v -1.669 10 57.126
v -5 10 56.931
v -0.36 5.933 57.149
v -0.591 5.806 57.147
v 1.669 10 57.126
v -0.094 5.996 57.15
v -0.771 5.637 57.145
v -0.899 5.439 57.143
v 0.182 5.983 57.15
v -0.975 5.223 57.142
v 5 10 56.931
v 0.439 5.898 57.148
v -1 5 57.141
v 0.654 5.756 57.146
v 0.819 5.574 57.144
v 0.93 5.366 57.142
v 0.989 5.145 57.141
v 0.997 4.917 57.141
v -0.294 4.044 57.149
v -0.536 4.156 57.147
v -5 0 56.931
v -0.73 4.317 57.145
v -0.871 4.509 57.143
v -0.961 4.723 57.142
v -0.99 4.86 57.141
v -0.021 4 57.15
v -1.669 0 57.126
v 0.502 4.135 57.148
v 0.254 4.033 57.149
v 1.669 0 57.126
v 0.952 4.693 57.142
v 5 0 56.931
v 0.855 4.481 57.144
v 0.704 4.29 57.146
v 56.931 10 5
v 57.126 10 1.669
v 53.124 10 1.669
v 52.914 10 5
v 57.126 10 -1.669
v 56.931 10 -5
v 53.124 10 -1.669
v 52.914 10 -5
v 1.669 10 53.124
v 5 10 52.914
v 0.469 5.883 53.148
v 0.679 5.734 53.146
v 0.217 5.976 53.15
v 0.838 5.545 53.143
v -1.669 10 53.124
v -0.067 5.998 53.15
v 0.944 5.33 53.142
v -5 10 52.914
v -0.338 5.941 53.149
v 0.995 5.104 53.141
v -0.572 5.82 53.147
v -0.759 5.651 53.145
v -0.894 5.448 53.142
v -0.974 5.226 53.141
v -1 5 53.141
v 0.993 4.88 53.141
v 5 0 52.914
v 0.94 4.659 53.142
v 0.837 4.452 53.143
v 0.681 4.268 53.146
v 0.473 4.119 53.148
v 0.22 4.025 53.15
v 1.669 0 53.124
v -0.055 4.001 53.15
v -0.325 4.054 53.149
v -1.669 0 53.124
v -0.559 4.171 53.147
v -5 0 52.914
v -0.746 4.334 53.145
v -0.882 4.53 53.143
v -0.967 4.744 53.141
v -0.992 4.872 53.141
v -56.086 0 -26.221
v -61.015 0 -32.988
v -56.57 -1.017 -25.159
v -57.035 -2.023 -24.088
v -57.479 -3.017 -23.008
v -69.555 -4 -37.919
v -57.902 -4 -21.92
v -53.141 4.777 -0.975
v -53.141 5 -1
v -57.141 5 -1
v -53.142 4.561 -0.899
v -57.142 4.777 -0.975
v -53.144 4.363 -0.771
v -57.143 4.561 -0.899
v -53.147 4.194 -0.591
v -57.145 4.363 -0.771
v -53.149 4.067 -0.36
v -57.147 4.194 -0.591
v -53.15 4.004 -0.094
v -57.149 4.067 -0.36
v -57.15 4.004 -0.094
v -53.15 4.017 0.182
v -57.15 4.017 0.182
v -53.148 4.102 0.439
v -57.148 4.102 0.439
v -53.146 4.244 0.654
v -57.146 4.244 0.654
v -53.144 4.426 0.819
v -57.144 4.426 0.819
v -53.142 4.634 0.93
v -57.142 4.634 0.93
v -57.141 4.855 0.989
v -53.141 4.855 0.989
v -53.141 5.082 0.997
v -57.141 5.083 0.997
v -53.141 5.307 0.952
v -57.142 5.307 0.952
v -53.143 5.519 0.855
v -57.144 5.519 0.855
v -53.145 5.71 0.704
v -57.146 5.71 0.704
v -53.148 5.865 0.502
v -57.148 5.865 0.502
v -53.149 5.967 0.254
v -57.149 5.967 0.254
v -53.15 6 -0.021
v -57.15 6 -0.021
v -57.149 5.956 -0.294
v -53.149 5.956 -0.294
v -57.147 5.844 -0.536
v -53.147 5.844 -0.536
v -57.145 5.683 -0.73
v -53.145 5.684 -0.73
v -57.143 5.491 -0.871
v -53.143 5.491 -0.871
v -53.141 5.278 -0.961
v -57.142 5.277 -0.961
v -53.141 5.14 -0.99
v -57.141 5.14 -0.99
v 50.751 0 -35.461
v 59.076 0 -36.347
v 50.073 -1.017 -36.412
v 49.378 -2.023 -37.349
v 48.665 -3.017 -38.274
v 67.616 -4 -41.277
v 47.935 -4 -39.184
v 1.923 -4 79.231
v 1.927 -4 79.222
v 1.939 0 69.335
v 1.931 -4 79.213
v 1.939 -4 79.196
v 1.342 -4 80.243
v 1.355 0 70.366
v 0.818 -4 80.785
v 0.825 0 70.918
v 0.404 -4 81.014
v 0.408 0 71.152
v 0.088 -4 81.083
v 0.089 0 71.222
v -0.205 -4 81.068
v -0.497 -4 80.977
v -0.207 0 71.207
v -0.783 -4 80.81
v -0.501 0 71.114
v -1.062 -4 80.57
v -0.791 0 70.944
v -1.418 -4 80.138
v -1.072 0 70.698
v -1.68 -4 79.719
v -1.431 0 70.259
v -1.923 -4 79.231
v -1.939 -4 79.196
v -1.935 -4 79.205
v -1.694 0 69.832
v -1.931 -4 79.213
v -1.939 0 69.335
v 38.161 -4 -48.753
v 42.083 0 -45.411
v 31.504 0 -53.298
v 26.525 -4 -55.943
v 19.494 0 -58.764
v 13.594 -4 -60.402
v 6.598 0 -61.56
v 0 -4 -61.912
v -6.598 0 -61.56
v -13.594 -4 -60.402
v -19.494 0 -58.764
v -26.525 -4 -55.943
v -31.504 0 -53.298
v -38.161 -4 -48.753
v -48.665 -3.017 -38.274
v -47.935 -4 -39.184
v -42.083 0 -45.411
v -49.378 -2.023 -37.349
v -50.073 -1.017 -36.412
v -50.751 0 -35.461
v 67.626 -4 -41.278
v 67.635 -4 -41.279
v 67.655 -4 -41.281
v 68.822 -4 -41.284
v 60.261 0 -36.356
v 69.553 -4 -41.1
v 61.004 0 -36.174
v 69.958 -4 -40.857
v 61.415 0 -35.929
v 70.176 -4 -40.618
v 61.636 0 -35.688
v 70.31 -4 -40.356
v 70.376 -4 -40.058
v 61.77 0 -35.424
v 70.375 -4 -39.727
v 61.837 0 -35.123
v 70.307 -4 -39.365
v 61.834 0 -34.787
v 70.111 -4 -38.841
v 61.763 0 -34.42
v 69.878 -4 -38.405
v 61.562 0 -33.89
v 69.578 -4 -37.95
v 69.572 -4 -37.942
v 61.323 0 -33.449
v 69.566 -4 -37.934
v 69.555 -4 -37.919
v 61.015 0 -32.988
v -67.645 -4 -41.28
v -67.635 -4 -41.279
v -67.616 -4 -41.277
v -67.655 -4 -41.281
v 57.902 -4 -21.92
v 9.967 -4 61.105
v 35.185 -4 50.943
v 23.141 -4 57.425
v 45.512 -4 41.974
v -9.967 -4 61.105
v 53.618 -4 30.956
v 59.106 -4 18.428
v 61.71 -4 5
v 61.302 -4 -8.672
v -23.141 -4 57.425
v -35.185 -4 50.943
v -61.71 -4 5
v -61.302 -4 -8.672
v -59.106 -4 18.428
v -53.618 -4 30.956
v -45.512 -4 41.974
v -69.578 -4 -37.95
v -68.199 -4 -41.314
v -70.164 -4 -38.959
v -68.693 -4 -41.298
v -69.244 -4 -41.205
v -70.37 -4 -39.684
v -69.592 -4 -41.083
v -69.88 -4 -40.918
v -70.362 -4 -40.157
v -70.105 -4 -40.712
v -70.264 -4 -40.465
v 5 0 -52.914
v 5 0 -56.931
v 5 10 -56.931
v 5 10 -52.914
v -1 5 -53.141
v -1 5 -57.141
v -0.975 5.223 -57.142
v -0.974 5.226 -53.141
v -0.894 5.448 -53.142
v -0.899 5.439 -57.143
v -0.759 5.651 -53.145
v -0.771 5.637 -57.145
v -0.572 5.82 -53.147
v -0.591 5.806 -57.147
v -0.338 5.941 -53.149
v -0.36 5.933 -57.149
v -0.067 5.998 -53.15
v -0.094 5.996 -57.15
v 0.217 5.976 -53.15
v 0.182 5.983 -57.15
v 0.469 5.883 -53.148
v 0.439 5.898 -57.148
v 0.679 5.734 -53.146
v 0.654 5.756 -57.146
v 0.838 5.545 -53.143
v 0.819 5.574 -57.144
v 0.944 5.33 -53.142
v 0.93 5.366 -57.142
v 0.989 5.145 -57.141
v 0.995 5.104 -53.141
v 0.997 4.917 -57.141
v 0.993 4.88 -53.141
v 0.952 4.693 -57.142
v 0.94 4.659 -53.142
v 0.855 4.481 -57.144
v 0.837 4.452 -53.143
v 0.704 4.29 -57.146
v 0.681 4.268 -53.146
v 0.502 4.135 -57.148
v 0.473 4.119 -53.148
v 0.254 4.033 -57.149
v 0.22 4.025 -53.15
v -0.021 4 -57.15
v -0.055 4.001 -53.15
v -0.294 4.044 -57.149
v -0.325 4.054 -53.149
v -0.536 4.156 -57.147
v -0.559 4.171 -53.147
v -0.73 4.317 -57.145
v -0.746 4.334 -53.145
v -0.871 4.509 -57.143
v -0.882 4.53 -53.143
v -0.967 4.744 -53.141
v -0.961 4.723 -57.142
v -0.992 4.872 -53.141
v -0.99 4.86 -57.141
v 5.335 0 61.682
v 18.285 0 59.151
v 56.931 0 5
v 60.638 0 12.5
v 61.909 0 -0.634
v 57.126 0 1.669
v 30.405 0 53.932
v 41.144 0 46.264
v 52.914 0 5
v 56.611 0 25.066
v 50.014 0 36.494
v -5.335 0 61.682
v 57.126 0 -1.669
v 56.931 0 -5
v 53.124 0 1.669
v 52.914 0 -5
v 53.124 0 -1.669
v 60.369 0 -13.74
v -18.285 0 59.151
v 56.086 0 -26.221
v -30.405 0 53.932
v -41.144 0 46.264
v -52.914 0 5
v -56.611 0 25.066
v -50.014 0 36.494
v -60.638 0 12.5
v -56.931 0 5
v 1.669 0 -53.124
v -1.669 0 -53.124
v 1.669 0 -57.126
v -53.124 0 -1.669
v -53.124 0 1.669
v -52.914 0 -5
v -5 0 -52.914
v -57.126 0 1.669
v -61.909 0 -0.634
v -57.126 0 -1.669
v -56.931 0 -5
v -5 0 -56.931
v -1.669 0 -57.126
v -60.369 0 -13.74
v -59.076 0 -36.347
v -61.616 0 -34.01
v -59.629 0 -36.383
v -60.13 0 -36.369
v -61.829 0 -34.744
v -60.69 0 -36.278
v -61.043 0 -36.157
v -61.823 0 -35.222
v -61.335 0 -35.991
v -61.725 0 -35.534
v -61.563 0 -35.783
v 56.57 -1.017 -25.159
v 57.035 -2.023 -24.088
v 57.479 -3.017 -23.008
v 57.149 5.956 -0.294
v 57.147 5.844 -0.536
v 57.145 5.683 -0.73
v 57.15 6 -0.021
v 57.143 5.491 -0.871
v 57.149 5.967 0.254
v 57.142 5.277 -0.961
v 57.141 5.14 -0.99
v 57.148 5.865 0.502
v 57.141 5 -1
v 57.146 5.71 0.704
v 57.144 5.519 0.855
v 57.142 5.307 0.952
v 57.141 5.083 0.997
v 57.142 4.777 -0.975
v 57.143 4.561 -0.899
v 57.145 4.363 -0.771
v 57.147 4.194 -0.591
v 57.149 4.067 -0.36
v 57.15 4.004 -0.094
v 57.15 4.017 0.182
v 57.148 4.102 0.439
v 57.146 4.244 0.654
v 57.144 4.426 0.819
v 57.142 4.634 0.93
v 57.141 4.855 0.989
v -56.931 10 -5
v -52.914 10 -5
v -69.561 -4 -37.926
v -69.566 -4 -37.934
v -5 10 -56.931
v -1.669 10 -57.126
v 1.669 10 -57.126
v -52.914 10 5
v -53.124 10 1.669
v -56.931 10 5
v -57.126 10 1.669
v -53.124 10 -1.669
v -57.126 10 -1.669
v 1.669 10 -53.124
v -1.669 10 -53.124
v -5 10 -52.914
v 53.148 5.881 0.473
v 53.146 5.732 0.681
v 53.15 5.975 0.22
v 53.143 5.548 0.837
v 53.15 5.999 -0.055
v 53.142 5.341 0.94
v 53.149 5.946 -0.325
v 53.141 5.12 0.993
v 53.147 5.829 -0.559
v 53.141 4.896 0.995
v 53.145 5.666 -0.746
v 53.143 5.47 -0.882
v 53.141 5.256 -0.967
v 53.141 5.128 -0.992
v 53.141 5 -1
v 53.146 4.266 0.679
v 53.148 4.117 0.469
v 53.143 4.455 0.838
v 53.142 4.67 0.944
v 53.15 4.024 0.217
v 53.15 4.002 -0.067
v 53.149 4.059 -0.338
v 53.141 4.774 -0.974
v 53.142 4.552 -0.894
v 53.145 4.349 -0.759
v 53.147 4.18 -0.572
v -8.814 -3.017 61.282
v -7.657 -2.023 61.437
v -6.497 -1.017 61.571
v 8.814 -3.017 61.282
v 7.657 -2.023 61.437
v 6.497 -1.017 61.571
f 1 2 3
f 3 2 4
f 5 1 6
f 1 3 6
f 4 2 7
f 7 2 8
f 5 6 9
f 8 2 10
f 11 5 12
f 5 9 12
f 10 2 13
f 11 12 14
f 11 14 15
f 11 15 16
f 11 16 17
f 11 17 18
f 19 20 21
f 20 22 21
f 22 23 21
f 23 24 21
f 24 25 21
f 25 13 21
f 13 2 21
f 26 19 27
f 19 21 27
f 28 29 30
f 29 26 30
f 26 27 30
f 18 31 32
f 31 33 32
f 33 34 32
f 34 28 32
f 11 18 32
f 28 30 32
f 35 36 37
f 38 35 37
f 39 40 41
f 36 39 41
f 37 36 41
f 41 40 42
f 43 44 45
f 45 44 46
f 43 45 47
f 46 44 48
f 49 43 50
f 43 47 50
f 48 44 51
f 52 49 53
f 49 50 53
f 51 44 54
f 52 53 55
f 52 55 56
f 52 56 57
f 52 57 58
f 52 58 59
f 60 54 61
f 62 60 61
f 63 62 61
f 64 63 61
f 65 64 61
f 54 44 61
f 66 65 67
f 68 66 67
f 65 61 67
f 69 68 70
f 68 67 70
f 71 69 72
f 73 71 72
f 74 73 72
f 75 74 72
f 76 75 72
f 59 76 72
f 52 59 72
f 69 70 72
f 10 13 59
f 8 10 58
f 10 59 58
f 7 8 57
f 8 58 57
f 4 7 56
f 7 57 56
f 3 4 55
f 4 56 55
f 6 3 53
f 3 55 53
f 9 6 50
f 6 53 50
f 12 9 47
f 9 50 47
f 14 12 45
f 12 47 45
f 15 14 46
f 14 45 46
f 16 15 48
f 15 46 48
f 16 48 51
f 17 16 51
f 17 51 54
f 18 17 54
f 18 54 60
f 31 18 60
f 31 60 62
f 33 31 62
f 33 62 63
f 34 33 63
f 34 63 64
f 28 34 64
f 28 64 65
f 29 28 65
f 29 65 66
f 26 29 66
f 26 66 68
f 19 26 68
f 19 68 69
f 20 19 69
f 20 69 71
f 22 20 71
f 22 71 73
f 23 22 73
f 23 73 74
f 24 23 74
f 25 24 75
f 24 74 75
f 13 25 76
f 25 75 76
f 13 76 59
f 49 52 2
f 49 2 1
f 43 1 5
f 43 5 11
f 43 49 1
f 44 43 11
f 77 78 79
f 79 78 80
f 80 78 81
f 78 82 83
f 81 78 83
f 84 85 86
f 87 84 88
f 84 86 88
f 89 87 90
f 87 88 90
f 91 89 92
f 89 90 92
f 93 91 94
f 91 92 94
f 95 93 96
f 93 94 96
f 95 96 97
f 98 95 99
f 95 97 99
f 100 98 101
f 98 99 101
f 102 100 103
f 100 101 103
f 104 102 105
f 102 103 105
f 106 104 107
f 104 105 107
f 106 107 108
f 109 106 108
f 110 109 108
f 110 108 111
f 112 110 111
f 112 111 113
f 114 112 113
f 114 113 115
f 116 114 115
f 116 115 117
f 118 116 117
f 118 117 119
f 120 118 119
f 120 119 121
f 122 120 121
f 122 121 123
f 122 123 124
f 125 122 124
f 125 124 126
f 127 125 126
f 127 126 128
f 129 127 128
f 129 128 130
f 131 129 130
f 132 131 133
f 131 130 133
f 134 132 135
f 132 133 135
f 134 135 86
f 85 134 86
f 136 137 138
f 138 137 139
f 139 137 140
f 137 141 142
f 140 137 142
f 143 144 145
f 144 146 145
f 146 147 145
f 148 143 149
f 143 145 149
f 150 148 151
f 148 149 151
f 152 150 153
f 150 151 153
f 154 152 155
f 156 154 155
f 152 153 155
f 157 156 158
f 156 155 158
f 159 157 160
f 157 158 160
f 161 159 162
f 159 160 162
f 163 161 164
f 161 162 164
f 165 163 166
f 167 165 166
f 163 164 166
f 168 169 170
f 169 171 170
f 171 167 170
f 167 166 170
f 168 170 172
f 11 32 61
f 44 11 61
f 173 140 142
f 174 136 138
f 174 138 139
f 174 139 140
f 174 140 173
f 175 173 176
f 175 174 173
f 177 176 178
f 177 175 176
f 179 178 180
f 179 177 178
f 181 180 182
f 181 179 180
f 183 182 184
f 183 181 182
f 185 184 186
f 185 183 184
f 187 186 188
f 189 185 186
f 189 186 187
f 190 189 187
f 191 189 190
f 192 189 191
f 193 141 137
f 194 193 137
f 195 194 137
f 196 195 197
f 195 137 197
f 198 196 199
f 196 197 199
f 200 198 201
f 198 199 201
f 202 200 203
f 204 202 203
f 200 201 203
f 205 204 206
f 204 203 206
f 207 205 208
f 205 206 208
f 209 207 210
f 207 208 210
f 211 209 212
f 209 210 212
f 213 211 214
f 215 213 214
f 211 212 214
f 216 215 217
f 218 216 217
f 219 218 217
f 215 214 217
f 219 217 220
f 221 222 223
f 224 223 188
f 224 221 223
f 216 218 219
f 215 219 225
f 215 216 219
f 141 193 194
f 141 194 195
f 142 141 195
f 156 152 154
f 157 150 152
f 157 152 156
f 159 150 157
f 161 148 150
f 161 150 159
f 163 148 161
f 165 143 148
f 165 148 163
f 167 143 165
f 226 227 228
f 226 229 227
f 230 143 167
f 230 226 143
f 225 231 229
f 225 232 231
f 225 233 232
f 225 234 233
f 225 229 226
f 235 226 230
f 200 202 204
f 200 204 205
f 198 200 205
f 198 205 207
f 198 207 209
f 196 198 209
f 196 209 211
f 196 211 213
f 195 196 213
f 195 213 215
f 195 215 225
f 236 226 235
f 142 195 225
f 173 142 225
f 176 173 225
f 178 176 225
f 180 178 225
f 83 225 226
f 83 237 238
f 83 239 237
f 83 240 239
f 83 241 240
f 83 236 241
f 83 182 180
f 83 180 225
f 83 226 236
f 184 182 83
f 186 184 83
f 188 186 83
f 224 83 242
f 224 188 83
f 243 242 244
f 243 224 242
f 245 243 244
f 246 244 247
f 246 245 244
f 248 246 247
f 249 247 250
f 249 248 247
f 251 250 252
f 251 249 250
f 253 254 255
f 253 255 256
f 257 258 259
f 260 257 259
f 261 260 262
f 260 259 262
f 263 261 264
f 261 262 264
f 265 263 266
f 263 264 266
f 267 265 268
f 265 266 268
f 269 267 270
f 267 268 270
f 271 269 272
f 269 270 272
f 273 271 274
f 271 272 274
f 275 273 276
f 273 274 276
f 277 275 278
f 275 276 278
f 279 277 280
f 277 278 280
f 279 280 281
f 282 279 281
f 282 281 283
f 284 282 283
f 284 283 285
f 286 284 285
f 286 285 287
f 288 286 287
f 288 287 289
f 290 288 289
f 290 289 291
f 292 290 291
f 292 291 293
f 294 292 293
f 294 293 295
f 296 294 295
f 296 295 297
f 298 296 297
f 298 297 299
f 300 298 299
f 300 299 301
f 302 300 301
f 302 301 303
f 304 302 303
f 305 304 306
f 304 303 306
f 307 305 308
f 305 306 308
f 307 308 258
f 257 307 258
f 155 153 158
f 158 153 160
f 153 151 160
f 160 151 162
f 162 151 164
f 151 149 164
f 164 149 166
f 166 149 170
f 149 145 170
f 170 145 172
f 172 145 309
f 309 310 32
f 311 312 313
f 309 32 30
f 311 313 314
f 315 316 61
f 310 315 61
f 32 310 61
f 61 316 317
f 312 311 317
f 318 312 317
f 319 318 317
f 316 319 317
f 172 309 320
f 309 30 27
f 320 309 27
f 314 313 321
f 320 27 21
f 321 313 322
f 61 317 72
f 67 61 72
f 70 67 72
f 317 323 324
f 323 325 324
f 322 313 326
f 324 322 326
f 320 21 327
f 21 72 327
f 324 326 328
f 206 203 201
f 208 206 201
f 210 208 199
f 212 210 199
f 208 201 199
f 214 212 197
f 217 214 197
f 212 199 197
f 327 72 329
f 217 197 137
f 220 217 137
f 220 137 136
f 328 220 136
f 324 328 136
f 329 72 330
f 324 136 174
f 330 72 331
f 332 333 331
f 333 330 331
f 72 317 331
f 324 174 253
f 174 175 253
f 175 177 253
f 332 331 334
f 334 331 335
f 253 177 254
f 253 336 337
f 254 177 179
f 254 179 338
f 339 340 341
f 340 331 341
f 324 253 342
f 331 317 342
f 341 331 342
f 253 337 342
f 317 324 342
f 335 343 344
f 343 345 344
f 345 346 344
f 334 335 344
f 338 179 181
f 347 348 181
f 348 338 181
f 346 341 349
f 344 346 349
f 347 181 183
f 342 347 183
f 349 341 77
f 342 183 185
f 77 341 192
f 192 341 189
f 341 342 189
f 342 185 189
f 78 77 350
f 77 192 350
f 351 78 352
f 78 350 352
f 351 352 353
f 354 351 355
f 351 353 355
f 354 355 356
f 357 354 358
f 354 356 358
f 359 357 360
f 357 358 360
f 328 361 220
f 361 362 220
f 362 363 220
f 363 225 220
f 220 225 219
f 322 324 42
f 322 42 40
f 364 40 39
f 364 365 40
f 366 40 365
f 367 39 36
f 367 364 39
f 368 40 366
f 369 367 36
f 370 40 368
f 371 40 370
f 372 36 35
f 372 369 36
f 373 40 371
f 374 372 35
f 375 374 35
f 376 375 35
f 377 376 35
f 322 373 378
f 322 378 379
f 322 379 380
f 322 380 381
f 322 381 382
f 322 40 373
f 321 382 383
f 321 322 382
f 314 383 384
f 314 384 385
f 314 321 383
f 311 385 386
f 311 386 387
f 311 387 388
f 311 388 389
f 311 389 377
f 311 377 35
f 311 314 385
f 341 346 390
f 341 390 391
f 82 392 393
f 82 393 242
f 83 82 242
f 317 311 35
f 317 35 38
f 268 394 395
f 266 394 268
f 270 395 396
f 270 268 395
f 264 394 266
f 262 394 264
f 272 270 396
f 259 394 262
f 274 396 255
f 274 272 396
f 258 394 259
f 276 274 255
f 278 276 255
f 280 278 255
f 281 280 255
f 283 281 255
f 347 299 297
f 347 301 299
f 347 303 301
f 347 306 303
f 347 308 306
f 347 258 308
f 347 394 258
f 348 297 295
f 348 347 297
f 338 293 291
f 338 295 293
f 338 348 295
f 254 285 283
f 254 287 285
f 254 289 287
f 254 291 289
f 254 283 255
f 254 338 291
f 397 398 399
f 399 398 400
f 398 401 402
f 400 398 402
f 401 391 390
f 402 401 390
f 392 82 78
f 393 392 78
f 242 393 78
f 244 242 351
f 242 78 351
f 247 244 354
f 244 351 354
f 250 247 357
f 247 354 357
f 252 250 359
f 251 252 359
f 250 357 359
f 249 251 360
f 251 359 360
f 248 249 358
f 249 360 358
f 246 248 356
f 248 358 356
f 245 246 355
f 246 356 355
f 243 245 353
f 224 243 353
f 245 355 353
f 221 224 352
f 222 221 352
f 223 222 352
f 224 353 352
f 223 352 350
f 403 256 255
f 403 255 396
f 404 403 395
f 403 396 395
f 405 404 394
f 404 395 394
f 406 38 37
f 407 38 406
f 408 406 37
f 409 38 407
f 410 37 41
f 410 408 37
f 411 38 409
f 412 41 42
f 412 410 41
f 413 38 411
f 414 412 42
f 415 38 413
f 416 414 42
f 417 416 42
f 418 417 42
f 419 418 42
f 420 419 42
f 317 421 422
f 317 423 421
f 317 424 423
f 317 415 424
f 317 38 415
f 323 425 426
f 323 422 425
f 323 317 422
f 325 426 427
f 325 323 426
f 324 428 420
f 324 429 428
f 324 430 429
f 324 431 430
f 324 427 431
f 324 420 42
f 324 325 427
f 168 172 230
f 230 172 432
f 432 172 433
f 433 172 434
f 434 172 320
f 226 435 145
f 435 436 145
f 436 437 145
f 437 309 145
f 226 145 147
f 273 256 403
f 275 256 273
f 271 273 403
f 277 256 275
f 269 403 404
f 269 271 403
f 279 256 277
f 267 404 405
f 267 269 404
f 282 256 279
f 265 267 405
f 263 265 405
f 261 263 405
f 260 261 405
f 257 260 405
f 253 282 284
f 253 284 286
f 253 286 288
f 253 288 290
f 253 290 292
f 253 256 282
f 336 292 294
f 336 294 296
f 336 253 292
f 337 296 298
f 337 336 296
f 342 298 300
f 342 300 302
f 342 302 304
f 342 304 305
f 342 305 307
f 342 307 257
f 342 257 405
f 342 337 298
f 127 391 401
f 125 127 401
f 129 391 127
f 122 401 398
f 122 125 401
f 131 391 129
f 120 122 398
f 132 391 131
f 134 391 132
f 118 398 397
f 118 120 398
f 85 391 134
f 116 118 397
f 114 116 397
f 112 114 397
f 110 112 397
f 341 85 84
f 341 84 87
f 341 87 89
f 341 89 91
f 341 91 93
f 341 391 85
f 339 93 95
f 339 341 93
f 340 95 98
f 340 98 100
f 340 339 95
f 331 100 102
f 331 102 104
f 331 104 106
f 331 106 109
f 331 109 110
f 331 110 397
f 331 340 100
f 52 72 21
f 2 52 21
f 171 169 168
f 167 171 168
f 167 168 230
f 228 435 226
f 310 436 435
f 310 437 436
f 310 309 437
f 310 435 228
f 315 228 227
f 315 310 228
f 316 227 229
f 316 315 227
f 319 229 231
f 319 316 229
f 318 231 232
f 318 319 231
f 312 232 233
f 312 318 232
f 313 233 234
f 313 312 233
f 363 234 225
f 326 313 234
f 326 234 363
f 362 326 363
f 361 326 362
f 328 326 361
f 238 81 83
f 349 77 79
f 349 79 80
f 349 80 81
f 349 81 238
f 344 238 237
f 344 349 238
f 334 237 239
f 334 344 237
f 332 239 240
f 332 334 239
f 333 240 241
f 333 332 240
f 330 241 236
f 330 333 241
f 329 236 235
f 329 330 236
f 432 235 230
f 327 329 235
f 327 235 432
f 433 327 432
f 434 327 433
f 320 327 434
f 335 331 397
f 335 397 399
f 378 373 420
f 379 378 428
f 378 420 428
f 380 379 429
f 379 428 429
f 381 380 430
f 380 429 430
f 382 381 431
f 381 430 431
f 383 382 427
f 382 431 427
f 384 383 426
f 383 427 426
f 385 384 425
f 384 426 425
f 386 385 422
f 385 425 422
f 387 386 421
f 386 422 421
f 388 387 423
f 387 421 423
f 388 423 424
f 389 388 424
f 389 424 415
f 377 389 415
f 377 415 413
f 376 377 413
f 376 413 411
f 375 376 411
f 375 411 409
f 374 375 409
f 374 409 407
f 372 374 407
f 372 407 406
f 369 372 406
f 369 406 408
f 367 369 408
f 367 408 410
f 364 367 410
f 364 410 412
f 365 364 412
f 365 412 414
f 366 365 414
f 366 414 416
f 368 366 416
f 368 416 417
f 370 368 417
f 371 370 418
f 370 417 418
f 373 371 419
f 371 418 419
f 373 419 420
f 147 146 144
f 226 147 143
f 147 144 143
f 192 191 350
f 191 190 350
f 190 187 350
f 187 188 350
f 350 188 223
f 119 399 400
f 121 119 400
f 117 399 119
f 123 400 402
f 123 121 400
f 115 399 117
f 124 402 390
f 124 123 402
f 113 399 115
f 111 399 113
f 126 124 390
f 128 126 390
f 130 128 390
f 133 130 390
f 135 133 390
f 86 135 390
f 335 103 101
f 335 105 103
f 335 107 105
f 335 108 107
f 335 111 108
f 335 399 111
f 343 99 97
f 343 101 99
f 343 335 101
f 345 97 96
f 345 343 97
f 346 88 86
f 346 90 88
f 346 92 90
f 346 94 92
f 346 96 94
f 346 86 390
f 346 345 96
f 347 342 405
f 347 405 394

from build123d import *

# Parameters (mm, degrees)
SKETCH4_R            = 61.9125
BOSS_EXTRUDE1_DEPTH  = 4
BOSS_EXTRUDE2_DEPTH  = 10
M2_CLEARANCE_HOLE2_D = 2
M2_CLEARANCE_HOLE3_D = 2
BOSS_EXTRUDE3_DEPTH  = 4
CHAMFER1_SIZE        = 4
FILLET1_R            = 3


# Some blends are built 0.0001 mm under size
with BuildPart() as part:
    # Sketch4 → Boss-Extrude1 (new body)
    with BuildSketch(Plane(origin=(0, 0, 0), x_dir=(1, 0, 0), z_dir=(0, 1, 0))):
        with Locations(Location((0, 0, 0), (0, 0, 270))):
            Circle(SKETCH4_R)
    extrude(amount=-BOSS_EXTRUDE1_DEPTH)

    # Sketch15 → Boss-Extrude2 (add)
    with BuildSketch(Plane(origin=(0, 0, 0), x_dir=(1, 0, 0), z_dir=(0, 1, 0))):
        with BuildLine():
            Line((-52.91429391, -5), (-56.930857187, -5))
            ThreePointArc((-56.930857187, -5), (-57.15, 0), (-56.930857187, 5))
            Line((-56.930857187, 5), (-52.91429391, 5))
            ThreePointArc((-52.91429391, 5), (-53.15, 0), (-52.91429391, -5))
        make_face()
        with BuildLine():
            Line((-5, 52.91429391), (-5, 56.930857187))
            ThreePointArc((-5, 56.930857187), (0, 57.15), (5, 56.930857187))
            Line((5, 56.930857187), (5, 52.91429391))
            ThreePointArc((5, 52.91429391), (0, 53.15), (-5, 52.91429391))
        make_face()
        with BuildLine():
            Line((-5, -52.91429391), (-5, -56.930857187))
            ThreePointArc((-5, -56.930857187), (0, -57.15), (5, -56.930857187))
            Line((5, -56.930857187), (5, -52.91429391))
            ThreePointArc((5, -52.91429391), (0, -53.15), (-5, -52.91429391))
        make_face()
        with BuildLine():
            Line((52.91429391, 5), (56.930857187, 5))
            ThreePointArc((56.930857187, 5), (57.15, 0), (56.930857187, -5))
            Line((56.930857187, -5), (52.91429391, -5))
            ThreePointArc((52.91429391, -5), (53.15, 0), (52.91429391, 5))
        make_face()
    extrude(amount=BOSS_EXTRUDE2_DEPTH)

    # M2 Clearance Hole2 (through all)
    with Locations(Plane(origin=(0, 5, 57.15), x_dir=(1, 0, 0), z_dir=(0, 0, 1))):
        with Locations((0, 0)):
            Hole(M2_CLEARANCE_HOLE2_D / 2)

    # M2 Clearance Hole3 (through all)
    with Locations(Plane(origin=(57.15, 5, 0), x_dir=(0, 0, 1), z_dir=(1, 0, 0))):
        with Locations((0, 0)):
            Hole(M2_CLEARANCE_HOLE3_D / 2)

    # Sketch19 → Boss-Extrude3 (add)
    with BuildSketch(Plane(origin=(0, 0, 0), x_dir=(1, 0, 0), z_dir=(0, 1, 0))):
        with BuildLine():
            Line((9.967336465, -61.104908641), (0, -83.564835105))
            Line((0, -83.564835105), (-9.967336465, -61.104908641))
            ThreePointArc((-9.967336465, -61.104908641), (0, -61.9125), (9.967336465, -61.104908641))
        make_face()
        with BuildLine():
            Line((-47.934734947, 39.184420907), (-72.369270064, 41.782417553))
            Line((-72.369270064, 41.782417553), (-57.902071411, 21.920487734))
            ThreePointArc((-57.902071411, 21.920487734), (-53.617797812, 30.95625), (-47.934734947, 39.184420907))
        make_face()
        with BuildLine():
            Line((57.902071411, 21.920487734), (72.369270064, 41.782417553))
            Line((72.369270064, 41.782417553), (47.934734947, 39.184420907))
            ThreePointArc((47.934734947, 39.184420907), (53.617797812, 30.95625), (57.902071411, 21.920487734))
        make_face()
    extrude(amount=-BOSS_EXTRUDE3_DEPTH)

    # Chamfer1
    chamfer1_edges = [part.edges().sort_by_distance(p)[0] for p in [
        (-60.152002506, 0, -40.48341923),
        (-65.135670738, 0, -31.851452643),
        (60.152002506, 0, -40.48341923),
        (65.135670738, 0, -31.851452643),
        (4.983668232, 0, 72.334871873),
        (-4.983668232, 0, 72.334871873),
    ]]
    chamfer(chamfer1_edges, length=CHAMFER1_SIZE - 0.0001)  # a hair under: the kernel refuses the full size

    # Fillet1
    # the kernel refuses this fillet: 3 mm, written as the material it takes off along each edge
    with BuildSketch(Plane(origin=(-58.731491813, 2.387836055, -33.908642608), x_dir=(-0.1711376698055133, -0.5989233275147531, 0.7823060435227348), z_dir=(-0.8025159588326043, -0.3758867485808155, -0.46333280486096456)), Plane(origin=(58.731491813, 2.387836055, -33.908642608), x_dir=(-0.5919280723220329, -0.5989233275147517, -0.5393625913574092), z_dir=(0.80251595883259, -0.3758867485808147, -0.4633328048609902))) as fillet1_piece_1:
        with BuildLine():
            CenterArc((FILLET1_R * 0.847005492593, -FILLET1_R), FILLET1_R, 90, 80.529565024)
            Line((-FILLET1_R * 0.139365143358, -FILLET1_R * 0.835461346383), (0, 0))
            Line((0, 0), (FILLET1_R * 0.847005492593, 0))
        make_face()
    extrude(amount=23.346319451, mode=Mode.SUBTRACT)
    with BuildSketch(Plane(origin=(0, 2.387836055, 67.817285216), x_dir=(-0.7630657421275423, -0.5989233275147525, -0.24294345216531282), z_dir=(0, -0.37588674858081544, 0.9266656097219444))) as fillet1_piece_2:
        with BuildLine():
            CenterArc((FILLET1_R * 0.847005492593, FILLET1_R), FILLET1_R, 189.470434976, 80.529565024)
            Line((-FILLET1_R * 0.139365143358, FILLET1_R * 0.835461346383), (0, 0))
            Line((0, 0), (FILLET1_R * 0.847005492593, 0))
        make_face()
    extrude(amount=23.346319451, mode=Mode.SUBTRACT)


solid = part.part
